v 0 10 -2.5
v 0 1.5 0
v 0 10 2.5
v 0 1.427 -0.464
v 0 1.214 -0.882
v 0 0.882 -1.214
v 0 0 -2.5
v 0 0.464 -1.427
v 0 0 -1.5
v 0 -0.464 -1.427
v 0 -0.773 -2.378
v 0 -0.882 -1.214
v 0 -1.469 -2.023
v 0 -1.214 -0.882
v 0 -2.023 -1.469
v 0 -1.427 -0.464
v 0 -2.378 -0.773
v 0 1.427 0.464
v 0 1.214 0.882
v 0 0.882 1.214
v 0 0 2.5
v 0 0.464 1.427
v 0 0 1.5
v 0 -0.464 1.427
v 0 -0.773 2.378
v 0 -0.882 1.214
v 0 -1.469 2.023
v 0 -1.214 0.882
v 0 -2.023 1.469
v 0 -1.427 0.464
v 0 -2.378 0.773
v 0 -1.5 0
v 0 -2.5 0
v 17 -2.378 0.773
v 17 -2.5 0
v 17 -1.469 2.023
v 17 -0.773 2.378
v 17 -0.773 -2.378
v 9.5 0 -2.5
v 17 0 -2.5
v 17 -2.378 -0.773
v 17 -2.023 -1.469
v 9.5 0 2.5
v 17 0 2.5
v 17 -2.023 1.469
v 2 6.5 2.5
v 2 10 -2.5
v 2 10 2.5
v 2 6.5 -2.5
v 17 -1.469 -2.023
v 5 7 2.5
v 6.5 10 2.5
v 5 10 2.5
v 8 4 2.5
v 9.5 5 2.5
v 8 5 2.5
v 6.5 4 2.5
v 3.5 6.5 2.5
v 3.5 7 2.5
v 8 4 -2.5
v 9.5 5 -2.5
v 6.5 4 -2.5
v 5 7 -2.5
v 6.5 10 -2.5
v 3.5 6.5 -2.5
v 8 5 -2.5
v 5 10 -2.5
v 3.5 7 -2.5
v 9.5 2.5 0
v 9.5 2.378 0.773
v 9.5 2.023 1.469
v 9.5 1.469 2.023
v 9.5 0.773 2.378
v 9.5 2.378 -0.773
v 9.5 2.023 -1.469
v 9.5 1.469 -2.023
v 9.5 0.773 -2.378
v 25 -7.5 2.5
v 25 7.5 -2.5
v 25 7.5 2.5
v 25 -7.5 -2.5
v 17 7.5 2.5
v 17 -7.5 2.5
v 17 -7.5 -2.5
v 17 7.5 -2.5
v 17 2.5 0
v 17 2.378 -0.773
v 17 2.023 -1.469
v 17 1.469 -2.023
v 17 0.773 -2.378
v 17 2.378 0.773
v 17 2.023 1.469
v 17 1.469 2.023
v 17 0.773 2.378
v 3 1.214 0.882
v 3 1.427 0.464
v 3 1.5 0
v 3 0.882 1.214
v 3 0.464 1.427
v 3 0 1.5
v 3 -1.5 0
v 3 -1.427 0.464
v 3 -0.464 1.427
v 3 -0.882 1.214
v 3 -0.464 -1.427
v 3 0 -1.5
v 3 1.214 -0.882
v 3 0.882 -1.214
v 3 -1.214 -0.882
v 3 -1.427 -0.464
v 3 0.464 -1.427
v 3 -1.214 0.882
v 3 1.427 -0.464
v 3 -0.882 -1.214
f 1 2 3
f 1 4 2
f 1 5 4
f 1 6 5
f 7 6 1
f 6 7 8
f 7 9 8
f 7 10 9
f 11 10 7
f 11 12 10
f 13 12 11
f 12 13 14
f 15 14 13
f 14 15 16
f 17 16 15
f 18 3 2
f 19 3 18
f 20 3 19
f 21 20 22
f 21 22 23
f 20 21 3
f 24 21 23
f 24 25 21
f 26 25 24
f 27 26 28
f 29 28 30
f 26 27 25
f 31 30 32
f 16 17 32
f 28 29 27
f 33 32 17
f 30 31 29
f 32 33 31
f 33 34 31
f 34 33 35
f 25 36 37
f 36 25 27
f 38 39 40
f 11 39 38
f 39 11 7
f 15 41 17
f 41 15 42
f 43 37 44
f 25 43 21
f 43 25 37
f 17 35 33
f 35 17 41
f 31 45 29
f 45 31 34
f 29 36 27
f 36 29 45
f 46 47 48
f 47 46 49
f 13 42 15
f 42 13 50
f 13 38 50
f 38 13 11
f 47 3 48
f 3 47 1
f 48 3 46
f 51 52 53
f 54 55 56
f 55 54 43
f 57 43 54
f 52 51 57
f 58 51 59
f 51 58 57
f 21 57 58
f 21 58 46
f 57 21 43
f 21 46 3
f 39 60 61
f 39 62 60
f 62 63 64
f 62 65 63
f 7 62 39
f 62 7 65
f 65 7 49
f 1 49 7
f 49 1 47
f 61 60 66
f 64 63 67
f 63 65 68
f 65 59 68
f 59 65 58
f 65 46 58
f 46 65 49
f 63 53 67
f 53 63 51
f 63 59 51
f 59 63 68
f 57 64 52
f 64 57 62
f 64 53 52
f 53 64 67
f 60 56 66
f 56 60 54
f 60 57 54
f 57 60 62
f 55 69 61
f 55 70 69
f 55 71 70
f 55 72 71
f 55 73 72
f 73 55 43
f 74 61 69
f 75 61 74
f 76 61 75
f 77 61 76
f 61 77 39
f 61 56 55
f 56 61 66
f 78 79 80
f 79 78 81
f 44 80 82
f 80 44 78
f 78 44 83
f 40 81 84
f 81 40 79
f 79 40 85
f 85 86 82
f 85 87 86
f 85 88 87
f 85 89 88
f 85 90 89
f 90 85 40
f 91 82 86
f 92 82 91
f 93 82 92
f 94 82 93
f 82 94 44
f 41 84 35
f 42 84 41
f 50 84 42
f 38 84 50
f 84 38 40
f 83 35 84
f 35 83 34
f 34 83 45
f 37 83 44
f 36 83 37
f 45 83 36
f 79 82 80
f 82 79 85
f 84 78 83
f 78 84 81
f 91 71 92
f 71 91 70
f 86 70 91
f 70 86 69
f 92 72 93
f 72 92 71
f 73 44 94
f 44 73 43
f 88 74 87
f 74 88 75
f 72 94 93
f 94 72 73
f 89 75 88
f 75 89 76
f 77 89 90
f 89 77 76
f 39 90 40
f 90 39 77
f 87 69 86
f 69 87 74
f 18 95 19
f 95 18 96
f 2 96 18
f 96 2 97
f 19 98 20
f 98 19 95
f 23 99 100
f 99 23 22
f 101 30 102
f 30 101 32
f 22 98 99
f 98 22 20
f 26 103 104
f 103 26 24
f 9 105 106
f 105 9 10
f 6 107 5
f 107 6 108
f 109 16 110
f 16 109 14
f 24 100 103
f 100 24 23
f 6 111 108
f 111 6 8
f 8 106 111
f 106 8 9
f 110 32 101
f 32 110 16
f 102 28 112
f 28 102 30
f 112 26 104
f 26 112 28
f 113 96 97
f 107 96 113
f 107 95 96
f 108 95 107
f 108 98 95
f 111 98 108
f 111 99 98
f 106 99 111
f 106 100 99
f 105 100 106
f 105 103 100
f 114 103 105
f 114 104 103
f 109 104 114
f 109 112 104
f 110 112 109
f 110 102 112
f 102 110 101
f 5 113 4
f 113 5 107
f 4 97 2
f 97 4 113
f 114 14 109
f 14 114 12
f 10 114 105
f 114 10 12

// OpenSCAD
/* By JuJa */

/* define the key profile according to the plan */
/* width of the profile, lenght of the profile */ 
key_profile = [ [2   ,10  ],
                [1.5 ,6.5 ],
                [1.5 ,7   ],
                [1.5 ,10  ],
                [1.5 ,4   ],
                [1.5 ,5   ]];

/* make recusive function to calcualte the offset */ 
function offset(key_profile, i ) =  i > 0 ?  key_profile[i-1][0] + offset(key_profile, i-1 )  : 0; 

module profile( l , h ){
    diameter=5;
    rotate ([90,0,90]){
       cylinder(d=diameter , h=h, center=true,$fn=20);
       translate([l/2,0,0]) cube([l,diameter,h],center=true);
    }
}


/* generate the profile */
module full_profile(){
    for ( i = [0 : len(key_profile)-1] ){    
      echo ( offset(key_profile,i)  );
      translate([  offset(key_profile, i ) + key_profile[i][0]/2, 0 , 0]) 
      profile( key_profile[i][1] , key_profile[i][0] );
    }
}

//define the size of the element
cube_x= 8;
cube_y=15;
cube_z= 5;

cylinder_d=5;
cylinder_h=17;

hole_d=3;
hole_h=3;


difference(){
   union(){
        translate([cylinder_h +cube_x/2,0,0])
        cube([cube_x,cube_y,cube_z],center=true);
        
        translate([cylinder_h/2,0,0])
        rotate ([90,0,90])cylinder( d=cylinder_d , h=cylinder_h, center=true,$fn=20);

        full_profile();
       
   }  
   
    translate([hole_h/2,0,0])
    rotate ([90,0,90])
    cylinder(d=hole_d , h=hole_h, center=true,$fn=20);
}   
